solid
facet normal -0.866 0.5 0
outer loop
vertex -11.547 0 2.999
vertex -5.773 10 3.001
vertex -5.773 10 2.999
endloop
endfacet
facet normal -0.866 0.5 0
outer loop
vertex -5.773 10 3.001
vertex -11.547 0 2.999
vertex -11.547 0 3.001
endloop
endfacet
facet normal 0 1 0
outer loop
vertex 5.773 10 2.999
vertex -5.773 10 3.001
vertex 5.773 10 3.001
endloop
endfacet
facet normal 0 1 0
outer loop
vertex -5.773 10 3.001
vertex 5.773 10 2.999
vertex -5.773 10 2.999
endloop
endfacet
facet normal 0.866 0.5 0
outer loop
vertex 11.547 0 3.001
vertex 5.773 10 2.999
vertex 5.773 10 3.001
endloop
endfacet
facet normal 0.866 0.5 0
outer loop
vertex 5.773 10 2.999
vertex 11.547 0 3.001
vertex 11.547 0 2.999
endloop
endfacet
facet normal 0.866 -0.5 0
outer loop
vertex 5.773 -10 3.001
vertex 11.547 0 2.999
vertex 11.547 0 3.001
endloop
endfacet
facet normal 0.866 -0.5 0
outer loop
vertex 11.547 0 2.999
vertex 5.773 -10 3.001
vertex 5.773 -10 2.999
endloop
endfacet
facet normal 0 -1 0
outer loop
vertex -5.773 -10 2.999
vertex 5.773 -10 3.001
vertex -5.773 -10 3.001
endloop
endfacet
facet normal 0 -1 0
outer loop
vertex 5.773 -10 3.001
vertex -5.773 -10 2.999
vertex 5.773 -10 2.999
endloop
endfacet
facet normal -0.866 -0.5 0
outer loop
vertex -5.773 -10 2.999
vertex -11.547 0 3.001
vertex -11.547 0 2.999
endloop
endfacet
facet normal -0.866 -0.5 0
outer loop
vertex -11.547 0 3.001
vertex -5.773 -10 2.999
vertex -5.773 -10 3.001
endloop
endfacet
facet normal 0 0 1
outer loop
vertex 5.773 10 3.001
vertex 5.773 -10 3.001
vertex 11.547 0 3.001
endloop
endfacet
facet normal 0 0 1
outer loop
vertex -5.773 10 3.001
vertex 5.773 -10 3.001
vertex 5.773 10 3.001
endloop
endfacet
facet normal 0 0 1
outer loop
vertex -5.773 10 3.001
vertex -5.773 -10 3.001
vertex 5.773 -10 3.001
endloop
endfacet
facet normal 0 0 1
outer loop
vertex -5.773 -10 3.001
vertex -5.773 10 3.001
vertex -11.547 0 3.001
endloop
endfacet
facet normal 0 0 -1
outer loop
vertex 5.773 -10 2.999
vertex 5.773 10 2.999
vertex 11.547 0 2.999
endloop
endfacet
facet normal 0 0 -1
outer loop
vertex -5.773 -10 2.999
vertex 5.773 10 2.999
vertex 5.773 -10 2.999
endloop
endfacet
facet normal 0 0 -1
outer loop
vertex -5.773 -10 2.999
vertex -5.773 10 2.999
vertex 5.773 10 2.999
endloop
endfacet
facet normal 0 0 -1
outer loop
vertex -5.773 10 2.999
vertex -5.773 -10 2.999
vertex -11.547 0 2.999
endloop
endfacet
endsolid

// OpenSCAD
// file: ../hsw.scad
// hsw.scad: shared sizes and cell geometry for the honeycomb storage wall.
//
// The wall, the inserts and the clips all read their sizes from here, so a
// change to the hole, the wall or the depth carries through to every part.
// Include it before setting any of these in your own file to override them.
//
// Coordinates: the wall lies in the XY plane, back face at z = 0, front face
// at z = hsw_depth. Cells are hexagons with corners at 0 and 180 degrees,
// columns along x.

/* [Honeycomb size] */
// Hole across flats (mm)
hsw_hole = 20;
// Wall around each hole (mm); neighbouring cells sit wall to wall
hsw_wall = 1.8;
// Grid depth, back to front (mm)
hsw_depth = 8;

/* [Insert lock] */
// Height above the back face where the hole starts to widen (mm)
hsw_lock_z = 5.1;
// Depth of the wider opening at the front (mm)
hsw_lip_depth = 2;
// How much each wall thins in the front opening (mm)
hsw_lip = 1;
// Chamfer on the back edge of each hole, against elephant's foot (mm)
hsw_back_chamfer_w = 0.4;
hsw_back_chamfer_h = 0.5;

// ---------------- Derived ----------------
// Outer cell across flats, and the cell's side (= circumradius)
function hsw_cell_flats() = hsw_hole + 2 * hsw_wall;
function hsw_cell_side() = hsw_cell_flats() / sqrt(3);
// Centre-to-centre spacing: between columns, and between rows in a column
function hsw_pitch_x() = 1.5 * hsw_cell_side();
function hsw_pitch_y() = hsw_cell_flats();
// Hole across flats at the front opening
function hsw_front_hole() = hsw_hole + 2 * hsw_lip;

// The hole's width across flats from the back face (z = 0) to the front:
// chamfered at the back, straight to the lock, widening to the front opening.
function hsw_hole_profile(depth = hsw_depth) =
    [
        [hsw_hole + 2 * hsw_back_chamfer_w, 0],
        [hsw_hole, hsw_back_chamfer_h],
        [hsw_hole, hsw_lock_z],
        [hsw_front_hole(), depth - hsw_lip_depth],
        [hsw_front_hole(), depth],
    ];

// A regular hexagon across flats f, corners at 0 and 180 degrees.
module hsw_hexagon(f) {
    circle(r=f / sqrt(3), $fn=6);
}

// The hole as a solid, slightly longer than the cell so it cuts cleanly.
module hsw_hole_solid(depth = hsw_depth) {
    p = hsw_hole_profile(depth);
    e = 0.01;
    rotate_extrude($fn=6)
        polygon(
            concat(
                [[0, -e], [p[0][0] / sqrt(3), -e]],
                [for (q = p) [q[0] / sqrt(3), q[1]]],
                [[p[len(p) - 1][0] / sqrt(3), depth + e], [0, depth + e]]
            )
        );
}

// One cell: the outer hexagon less its hole.
module hsw_cell(depth = hsw_depth) {
    assert(
        depth >= hsw_lock_z + hsw_lip_depth,
        str("hsw_depth must be at least hsw_lock_z + hsw_lip_depth (", hsw_lock_z + hsw_lip_depth, " mm)")
    );
    difference() {
        linear_extrude(depth) hsw_hexagon(hsw_cell_flats());
        hsw_hole_solid(depth);
    }
}

// A straight wall with the hole's profile on its inner face, for closing a
// cut cell along a flat edge. It lies along y from 0 to len, outer face at
// x = 0 and inner face at x = hsw_wall, toward +x.
module hsw_edge_wall(len, depth = hsw_depth) {
    p = hsw_hole_profile(depth);
    rotate([90, 0, 0]) translate([0, 0, -len])
            linear_extrude(len)
                polygon(
                    concat(
                        [[0, 0]],
                        [for (q = p) [hsw_wall - (q[0] - hsw_hole) / 2, q[1]]],
                        [[0, depth]]
                    )
                );
}
// main file
// The hole's cross-section at height Z above the back face: a thin slice of
// the space inside one cell. Its extent across y is the hole across flats.
include <../hsw.scad>

Z = 3;
// thin enough that a sloped wall changes less than 0.01 mm across it
SLICE = 0.002;

intersection() {
    translate([-50, -50, Z - SLICE / 2]) cube([100, 100, SLICE]);
    difference() {
        linear_extrude(hsw_depth) hsw_hexagon(hsw_cell_flats());
        hsw_cell();
    }
}
